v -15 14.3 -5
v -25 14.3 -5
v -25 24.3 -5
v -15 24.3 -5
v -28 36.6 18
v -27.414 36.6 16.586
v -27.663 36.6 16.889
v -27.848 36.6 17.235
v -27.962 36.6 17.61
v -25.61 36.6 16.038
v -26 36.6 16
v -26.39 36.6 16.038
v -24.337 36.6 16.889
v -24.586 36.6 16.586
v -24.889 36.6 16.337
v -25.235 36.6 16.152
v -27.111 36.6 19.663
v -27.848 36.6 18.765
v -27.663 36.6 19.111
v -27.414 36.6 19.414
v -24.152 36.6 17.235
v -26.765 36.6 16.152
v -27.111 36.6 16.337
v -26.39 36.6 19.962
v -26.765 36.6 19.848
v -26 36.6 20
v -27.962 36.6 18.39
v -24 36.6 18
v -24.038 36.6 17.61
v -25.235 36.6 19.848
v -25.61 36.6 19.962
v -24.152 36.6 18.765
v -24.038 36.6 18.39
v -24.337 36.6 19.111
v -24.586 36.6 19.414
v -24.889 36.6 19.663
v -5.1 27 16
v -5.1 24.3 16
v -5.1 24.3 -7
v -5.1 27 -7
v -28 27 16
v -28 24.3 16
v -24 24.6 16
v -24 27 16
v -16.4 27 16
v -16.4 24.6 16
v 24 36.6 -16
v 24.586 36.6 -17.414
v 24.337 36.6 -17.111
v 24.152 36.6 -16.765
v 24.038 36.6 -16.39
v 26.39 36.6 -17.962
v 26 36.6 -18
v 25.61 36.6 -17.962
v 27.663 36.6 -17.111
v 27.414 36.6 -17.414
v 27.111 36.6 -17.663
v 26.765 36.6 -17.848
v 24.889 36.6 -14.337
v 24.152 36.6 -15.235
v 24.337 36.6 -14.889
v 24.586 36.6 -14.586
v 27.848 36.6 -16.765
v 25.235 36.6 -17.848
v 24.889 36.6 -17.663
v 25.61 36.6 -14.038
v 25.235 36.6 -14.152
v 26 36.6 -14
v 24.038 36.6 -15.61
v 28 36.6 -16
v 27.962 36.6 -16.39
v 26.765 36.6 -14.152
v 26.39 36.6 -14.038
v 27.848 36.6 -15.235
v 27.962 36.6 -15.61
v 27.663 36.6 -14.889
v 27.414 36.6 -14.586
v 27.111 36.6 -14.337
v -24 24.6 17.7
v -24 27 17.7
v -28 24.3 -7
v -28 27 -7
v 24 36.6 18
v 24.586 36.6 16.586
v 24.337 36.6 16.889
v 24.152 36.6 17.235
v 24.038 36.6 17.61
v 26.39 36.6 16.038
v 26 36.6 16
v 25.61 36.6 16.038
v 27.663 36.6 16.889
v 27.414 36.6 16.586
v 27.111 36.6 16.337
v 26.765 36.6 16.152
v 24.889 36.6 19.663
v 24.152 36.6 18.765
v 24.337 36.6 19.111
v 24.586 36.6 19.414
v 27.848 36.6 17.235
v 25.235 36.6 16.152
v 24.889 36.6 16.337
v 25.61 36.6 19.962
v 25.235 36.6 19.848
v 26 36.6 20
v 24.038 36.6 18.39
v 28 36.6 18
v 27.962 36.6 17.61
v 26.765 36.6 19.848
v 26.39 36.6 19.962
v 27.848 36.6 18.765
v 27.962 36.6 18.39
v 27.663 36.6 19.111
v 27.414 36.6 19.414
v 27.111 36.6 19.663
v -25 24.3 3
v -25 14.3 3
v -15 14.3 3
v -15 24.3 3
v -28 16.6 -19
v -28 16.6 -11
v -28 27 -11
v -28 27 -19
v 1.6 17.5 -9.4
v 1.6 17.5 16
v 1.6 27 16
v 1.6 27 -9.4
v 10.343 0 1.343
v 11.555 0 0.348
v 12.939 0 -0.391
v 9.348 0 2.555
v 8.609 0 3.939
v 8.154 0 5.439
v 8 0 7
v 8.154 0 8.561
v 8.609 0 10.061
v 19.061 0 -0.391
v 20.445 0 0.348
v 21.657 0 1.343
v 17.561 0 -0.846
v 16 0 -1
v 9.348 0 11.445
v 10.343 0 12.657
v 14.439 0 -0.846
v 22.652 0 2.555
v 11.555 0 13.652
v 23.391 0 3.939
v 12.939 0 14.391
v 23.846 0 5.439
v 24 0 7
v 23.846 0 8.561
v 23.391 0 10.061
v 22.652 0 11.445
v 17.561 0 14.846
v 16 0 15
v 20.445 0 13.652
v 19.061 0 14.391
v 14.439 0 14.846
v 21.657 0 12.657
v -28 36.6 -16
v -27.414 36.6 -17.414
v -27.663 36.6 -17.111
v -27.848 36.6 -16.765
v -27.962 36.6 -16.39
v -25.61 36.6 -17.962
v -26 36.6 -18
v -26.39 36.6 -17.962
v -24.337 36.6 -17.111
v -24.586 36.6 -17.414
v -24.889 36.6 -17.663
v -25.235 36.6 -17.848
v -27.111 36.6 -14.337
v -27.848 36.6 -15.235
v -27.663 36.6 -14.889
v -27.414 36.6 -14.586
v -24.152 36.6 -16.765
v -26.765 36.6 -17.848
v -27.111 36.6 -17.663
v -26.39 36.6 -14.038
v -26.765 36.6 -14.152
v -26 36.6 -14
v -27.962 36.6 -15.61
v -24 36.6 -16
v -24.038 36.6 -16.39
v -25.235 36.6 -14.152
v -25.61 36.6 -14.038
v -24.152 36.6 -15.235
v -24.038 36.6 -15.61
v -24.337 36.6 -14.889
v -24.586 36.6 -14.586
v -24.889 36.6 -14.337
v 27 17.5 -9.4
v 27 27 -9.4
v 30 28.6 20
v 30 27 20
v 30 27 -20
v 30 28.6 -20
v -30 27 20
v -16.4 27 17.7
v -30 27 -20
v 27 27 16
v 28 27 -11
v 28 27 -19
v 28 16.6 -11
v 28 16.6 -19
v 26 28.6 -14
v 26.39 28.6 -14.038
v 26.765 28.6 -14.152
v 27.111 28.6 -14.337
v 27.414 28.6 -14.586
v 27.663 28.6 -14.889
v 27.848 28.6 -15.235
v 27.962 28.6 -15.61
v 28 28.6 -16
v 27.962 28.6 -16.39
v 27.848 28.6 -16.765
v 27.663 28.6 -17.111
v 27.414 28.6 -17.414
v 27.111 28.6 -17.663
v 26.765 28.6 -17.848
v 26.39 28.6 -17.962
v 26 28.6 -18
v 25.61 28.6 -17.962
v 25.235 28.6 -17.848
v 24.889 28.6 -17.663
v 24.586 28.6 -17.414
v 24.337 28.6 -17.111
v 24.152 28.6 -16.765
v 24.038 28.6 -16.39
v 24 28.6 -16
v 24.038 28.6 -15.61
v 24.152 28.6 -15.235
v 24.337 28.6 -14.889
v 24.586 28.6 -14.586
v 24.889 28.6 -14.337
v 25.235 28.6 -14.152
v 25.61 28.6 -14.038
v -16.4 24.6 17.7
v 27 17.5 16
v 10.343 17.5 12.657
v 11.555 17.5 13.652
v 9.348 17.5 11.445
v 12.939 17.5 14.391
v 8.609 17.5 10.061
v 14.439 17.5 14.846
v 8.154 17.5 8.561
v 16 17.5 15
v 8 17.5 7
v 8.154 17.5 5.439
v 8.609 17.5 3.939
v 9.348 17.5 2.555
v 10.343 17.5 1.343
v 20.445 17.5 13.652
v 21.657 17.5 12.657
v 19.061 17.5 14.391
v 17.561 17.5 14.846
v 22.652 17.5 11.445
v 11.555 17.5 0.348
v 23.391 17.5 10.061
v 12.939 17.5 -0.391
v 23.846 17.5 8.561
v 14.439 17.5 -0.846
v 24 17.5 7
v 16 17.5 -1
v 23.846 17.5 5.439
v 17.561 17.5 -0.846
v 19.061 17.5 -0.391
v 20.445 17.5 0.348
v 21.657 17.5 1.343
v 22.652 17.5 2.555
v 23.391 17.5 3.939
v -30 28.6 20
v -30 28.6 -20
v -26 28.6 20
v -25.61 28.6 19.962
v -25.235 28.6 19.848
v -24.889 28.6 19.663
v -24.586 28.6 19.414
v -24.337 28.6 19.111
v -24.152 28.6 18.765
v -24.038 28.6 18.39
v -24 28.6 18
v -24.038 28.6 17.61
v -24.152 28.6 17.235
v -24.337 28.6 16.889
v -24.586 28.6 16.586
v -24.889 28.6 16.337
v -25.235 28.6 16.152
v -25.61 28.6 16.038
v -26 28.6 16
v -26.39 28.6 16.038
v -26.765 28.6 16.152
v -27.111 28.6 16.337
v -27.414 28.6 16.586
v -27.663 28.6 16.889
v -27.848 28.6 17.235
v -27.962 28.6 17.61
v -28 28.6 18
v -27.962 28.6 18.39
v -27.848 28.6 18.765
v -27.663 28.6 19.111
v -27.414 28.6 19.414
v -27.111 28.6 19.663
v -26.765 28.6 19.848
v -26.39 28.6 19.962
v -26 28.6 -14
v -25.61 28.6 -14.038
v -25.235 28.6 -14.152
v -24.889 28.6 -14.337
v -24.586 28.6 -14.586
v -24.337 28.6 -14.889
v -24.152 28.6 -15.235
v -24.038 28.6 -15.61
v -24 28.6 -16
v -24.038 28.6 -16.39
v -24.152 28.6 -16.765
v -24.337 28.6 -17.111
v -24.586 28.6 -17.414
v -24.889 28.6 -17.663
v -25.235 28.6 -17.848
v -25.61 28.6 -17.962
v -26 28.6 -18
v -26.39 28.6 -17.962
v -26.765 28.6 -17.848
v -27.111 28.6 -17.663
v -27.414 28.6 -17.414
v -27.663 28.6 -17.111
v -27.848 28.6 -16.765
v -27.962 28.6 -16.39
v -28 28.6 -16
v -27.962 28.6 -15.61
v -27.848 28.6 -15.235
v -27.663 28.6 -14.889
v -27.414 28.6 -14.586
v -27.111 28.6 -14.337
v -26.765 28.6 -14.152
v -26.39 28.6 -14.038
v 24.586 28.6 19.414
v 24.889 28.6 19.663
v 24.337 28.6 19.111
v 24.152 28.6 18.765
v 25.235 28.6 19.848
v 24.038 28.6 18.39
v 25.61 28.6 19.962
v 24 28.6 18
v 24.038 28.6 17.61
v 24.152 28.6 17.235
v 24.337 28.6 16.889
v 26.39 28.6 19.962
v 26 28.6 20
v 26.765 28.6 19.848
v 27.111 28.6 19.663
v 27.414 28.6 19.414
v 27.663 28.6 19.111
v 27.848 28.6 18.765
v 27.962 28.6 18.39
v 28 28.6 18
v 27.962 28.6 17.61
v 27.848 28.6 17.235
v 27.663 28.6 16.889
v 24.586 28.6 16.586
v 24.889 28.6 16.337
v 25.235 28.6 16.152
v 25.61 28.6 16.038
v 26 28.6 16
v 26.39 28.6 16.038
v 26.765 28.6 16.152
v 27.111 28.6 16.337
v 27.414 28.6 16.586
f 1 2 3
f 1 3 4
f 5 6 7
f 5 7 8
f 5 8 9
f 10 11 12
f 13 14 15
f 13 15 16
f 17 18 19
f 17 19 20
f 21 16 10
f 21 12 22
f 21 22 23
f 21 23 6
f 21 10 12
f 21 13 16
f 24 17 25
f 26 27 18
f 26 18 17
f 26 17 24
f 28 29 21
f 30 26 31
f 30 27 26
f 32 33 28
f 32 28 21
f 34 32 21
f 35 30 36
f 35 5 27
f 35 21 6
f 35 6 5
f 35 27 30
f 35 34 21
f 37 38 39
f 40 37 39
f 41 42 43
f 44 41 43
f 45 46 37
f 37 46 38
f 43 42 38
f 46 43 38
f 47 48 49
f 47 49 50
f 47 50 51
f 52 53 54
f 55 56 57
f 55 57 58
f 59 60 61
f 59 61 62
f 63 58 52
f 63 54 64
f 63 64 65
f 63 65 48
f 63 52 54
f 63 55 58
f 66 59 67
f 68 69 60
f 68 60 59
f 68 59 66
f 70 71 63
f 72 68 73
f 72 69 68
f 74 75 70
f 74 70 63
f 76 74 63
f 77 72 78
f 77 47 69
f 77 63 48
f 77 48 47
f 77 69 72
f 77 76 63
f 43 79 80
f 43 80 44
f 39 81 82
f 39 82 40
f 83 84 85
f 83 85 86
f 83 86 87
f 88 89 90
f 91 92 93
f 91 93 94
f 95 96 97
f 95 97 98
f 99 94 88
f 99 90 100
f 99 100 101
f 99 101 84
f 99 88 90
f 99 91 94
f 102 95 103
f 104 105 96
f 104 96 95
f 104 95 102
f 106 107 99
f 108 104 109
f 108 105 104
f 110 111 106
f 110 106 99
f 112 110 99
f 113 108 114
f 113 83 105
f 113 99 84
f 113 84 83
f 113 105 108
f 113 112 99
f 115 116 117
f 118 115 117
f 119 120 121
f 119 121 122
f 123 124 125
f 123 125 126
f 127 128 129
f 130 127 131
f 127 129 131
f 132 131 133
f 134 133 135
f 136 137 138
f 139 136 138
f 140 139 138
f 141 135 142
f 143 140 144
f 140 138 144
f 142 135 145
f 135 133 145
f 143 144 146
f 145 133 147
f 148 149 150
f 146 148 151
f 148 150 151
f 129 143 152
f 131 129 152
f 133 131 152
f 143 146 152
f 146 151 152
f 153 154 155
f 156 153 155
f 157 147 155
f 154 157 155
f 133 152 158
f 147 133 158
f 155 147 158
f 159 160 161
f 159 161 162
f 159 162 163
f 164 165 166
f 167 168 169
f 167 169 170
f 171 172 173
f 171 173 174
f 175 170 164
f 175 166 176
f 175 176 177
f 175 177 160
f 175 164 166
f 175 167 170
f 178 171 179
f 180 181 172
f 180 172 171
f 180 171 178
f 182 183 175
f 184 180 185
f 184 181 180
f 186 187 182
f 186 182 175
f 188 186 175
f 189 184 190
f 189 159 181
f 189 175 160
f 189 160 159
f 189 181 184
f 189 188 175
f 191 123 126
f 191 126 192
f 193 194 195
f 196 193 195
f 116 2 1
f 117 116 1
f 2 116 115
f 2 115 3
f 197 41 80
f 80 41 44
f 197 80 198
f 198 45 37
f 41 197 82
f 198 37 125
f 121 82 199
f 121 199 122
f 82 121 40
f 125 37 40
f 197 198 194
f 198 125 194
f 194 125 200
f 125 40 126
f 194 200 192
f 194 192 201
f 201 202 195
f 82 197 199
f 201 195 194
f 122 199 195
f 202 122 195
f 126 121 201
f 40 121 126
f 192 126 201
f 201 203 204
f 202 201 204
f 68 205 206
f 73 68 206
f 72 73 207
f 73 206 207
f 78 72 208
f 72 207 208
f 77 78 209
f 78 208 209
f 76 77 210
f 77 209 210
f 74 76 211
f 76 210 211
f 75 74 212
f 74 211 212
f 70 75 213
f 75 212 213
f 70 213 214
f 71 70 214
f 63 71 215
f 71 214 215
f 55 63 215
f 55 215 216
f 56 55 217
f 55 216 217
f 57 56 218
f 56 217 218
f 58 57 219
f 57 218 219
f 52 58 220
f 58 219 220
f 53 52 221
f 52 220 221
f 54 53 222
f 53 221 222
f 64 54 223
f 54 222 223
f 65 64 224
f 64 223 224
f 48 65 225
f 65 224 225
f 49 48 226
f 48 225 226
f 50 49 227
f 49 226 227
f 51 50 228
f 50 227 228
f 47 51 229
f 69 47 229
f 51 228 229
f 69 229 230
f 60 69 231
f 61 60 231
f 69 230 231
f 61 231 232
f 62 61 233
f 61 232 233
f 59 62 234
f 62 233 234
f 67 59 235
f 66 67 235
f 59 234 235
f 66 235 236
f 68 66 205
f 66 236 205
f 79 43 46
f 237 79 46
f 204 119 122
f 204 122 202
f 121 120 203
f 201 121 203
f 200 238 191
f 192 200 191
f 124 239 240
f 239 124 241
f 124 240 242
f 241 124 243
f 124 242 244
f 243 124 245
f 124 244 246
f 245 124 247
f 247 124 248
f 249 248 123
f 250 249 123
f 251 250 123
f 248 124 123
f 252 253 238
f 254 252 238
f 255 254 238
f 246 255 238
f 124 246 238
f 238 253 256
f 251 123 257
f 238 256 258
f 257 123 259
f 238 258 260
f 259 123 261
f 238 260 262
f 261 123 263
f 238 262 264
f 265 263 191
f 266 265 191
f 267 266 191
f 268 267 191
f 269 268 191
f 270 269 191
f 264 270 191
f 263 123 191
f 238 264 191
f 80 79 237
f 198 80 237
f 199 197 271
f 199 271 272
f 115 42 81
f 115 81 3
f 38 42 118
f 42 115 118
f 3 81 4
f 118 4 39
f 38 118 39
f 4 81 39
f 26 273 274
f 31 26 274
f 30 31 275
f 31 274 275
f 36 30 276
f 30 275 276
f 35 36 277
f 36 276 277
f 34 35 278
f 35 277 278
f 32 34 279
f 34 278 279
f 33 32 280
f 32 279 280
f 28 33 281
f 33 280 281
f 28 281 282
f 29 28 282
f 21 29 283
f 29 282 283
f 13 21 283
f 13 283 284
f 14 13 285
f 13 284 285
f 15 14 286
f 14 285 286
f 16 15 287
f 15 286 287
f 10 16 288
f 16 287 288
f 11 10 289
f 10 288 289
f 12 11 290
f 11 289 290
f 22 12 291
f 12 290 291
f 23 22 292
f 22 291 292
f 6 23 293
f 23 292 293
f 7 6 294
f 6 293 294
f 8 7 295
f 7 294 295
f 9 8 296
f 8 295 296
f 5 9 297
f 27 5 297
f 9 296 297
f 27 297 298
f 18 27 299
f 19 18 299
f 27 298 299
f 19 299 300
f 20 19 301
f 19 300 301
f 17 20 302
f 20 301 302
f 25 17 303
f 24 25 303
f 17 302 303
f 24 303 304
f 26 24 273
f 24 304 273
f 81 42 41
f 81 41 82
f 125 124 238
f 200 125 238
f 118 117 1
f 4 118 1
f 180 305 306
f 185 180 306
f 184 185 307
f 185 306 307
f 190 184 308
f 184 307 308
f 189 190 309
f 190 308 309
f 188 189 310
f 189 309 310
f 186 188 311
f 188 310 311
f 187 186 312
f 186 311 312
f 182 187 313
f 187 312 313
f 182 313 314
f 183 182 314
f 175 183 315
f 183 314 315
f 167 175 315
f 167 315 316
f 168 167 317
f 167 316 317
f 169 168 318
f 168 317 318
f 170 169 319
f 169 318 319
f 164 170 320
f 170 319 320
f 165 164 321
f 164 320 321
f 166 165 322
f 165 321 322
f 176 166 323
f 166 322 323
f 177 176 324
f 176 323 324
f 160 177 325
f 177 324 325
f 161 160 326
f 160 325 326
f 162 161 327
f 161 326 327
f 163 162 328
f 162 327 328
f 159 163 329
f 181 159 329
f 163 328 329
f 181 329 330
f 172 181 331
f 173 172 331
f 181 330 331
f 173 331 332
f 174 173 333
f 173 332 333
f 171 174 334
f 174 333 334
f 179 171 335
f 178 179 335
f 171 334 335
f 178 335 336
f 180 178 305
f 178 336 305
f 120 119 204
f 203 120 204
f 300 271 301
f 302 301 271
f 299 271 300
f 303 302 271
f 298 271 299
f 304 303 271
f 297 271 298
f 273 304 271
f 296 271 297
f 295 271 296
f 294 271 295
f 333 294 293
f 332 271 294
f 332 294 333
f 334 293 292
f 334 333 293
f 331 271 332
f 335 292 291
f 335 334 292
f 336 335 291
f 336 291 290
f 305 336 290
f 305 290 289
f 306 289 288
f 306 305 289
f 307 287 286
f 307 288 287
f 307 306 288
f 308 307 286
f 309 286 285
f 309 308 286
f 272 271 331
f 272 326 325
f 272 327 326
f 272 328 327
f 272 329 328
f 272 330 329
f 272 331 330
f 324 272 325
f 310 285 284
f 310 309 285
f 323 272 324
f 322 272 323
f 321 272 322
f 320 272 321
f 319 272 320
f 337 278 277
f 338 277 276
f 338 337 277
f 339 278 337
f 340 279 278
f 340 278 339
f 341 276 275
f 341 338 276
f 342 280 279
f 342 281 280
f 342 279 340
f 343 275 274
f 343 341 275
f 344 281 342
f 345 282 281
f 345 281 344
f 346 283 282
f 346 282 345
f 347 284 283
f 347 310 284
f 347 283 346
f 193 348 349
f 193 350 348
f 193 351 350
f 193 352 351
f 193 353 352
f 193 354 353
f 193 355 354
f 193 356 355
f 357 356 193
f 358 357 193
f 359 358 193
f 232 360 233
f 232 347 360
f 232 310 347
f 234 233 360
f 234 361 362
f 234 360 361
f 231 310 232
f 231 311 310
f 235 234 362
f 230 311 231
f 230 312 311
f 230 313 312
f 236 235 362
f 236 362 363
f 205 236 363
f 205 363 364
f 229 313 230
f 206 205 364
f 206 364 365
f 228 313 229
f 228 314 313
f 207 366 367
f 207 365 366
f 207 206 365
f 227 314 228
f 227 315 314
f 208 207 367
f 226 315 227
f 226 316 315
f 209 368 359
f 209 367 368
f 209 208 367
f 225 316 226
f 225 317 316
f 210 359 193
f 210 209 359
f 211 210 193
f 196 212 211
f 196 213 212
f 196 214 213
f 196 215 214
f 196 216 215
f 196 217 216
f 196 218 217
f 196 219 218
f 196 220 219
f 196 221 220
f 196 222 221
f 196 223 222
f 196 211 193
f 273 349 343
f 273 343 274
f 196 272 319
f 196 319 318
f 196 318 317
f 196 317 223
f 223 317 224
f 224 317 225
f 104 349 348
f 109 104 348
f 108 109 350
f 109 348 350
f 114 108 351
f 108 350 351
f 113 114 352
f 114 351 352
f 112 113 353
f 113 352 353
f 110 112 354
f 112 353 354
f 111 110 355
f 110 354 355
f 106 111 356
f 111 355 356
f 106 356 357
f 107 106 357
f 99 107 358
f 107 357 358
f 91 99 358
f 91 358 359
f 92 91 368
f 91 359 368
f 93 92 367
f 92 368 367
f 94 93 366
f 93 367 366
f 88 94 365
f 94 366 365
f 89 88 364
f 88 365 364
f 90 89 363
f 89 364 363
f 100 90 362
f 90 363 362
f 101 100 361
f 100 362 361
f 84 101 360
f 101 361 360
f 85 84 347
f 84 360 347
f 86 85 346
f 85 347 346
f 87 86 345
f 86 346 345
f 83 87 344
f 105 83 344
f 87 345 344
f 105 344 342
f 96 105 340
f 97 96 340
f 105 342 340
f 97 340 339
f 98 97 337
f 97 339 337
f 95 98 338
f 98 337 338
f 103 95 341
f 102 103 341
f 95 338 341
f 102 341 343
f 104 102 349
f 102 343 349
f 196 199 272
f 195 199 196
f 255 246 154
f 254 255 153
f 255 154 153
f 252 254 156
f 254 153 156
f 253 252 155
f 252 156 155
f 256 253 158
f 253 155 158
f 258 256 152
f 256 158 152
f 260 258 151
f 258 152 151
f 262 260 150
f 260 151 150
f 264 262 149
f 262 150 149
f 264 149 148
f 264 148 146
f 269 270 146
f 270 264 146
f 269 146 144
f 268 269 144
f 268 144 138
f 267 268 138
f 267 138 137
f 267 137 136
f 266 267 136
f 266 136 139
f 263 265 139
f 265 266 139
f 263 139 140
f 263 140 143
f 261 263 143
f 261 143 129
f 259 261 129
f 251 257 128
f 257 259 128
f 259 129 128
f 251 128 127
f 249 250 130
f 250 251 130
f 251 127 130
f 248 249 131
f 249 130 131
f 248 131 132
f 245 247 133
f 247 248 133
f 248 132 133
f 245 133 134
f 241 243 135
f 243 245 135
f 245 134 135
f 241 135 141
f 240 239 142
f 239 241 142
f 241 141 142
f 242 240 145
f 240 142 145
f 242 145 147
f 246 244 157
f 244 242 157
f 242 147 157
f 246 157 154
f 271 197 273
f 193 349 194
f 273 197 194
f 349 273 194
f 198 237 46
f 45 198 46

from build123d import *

# Parameters (mm, degrees)
P01_STANDOFF_START             = 28.6
SK_P01_STANDOFF_R              = 2
P01_STANDOFF_DEPTH             = 8
P02_STANDOFF_START             = 28.6
SK_P02_STANDOFF_R              = 2
P02_STANDOFF_DEPTH             = 8
P03_STANDOFF_START             = 28.6
SK_P03_STANDOFF_R              = 2
P03_STANDOFF_DEPTH             = 8
P04_STANDOFF_START             = 28.6
SK_P04_STANDOFF_R              = 2
P04_STANDOFF_DEPTH             = 8
P05_CARRIERBOARD_START         = 27
SK_P05_CARRIERBOARD_W          = 60
SK_P05_CARRIERBOARD_H          = 40
P05_CARRIERBOARD_DEPTH         = 1.6
P06_INA2602COMPUTE_START       = 24.3
SK_P06_INA2602COMPUTE_W        = 22.9
SK_P06_INA2602COMPUTE_H        = 23
P06_INA2602COMPUTE_DEPTH       = 2.7
P07_INA260TERMINALBLOCK_START  = 14.3
SK_P07_INA260TERMINALBLOCK_W   = 10
SK_P07_INA260TERMINALBLOCK_H   = 8
P07_INA260TERMINALBLOCK_DEPTH  = 10
P08_BUCKAD36V50F551V_START     = 17.5
SK_P08_BUCKAD36V50F551V_W      = 25.4
SK_P08_BUCKAD36V50F551V_H      = 25.4
P08_BUCKAD36V50F551V_DEPTH     = 9.5
P09_JSTXHHEADERSFACEDOWN_START = 16.6
SK_P09_JSTXHHEADERSFACEDOWN_W  = 56
SK_P09_JSTXHHEADERSFACEDOWN_H  = 8
P09_JSTXHHEADERSFACEDOWN_DEPTH = 10.4
P10_D2IDEALDIODE_START         = 24.6
SK_P10_D2IDEALDIODE_W          = 7.6
SK_P10_D2IDEALDIODE_H          = 12.7
P10_D2IDEALDIODE_DEPTH         = 2.4
SK_P11_C14700UF25V_R           = 8
P11_C14700UF25V_DEPTH          = 27


with BuildPart() as part:
    # SK_P01_Standoff → P01_Standoff (new body)
    with BuildSketch(Plane(origin=(0, 0, 0), x_dir=(1, 0, 0), z_dir=(0, 1, 0)).offset(P01_STANDOFF_START)):
        with Locations(Location((-26, -18, 0), (0, 0, 270))):
            Circle(SK_P01_STANDOFF_R)
    extrude(amount=P01_STANDOFF_DEPTH)



with BuildPart() as body_2:
    # SK_P02_Standoff → P02_Standoff (new body)
    with BuildSketch(Plane(origin=(0, 0, 0), x_dir=(1, 0, 0), z_dir=(0, 1, 0)).offset(P02_STANDOFF_START)):
        with Locations(Location((-26, 16, 0), (0, 0, 270))):
            Circle(SK_P02_STANDOFF_R)
    extrude(amount=P02_STANDOFF_DEPTH)


with BuildPart() as body_3:
    # SK_P03_Standoff → P03_Standoff (new body)
    with BuildSketch(Plane(origin=(0, 0, 0), x_dir=(1, 0, 0), z_dir=(0, 1, 0)).offset(P03_STANDOFF_START)):
        with Locations(Location((26, -18, 0), (0, 0, 270))):
            Circle(SK_P03_STANDOFF_R)
    extrude(amount=P03_STANDOFF_DEPTH)


with BuildPart() as body_4:
    # SK_P04_Standoff → P04_Standoff (new body)
    with BuildSketch(Plane(origin=(0, 0, 0), x_dir=(1, 0, 0), z_dir=(0, 1, 0)).offset(P04_STANDOFF_START)):
        with Locations(Location((26, 16, 0), (0, 0, 270))):
            Circle(SK_P04_STANDOFF_R)
    extrude(amount=P04_STANDOFF_DEPTH)


with BuildPart() as part_1:
    add(part.part)

    add(body_2.part)  # P05_Carrierboard merges body 2

    add(body_3.part)  # P05_Carrierboard merges body 3

    add(body_4.part)  # P05_Carrierboard merges body 4
    # SK_P05_Carrierboard → P05_Carrierboard (add)
    with BuildSketch(Plane(origin=(0, 0, 0), x_dir=(1, 0, 0), z_dir=(0, 1, 0)).offset(P05_CARRIERBOARD_START)):
        Rectangle(SK_P05_CARRIERBOARD_W, SK_P05_CARRIERBOARD_H)
    extrude(amount=P05_CARRIERBOARD_DEPTH)

    # SK_P06_INA2602compute → P06_INA2602compute (add)
    with BuildSketch(Plane(origin=(0, 0, 0), x_dir=(1, 0, 0), z_dir=(0, 1, 0)).offset(P06_INA2602COMPUTE_START)):
        with Locations((-16.55, -4.5)):
            Rectangle(SK_P06_INA2602COMPUTE_W, SK_P06_INA2602COMPUTE_H)
    extrude(amount=P06_INA2602COMPUTE_DEPTH)

    # SK_P07_INA260terminalblock → P07_INA260terminalblock (add)
    with BuildSketch(Plane(origin=(0, 0, 0), x_dir=(1, 0, 0), z_dir=(0, 1, 0)).offset(P07_INA260TERMINALBLOCK_START)):
        with Locations((-20, 1)):
            Rectangle(SK_P07_INA260TERMINALBLOCK_W, SK_P07_INA260TERMINALBLOCK_H)
    extrude(amount=P07_INA260TERMINALBLOCK_DEPTH)

    # SK_P08_BuckAD36V50F551V → P08_BuckAD36V50F551V (add)
    with BuildSketch(Plane(origin=(0, 0, 0), x_dir=(1, 0, 0), z_dir=(0, 1, 0)).offset(P08_BUCKAD36V50F551V_START)):
        with Locations((14.3, -3.3)):
            Rectangle(SK_P08_BUCKAD36V50F551V_W, SK_P08_BUCKAD36V50F551V_H)
    extrude(amount=P08_BUCKAD36V50F551V_DEPTH)

    # SK_P09_JSTXHheadersfacedown → P09_JSTXHheadersfacedown (add)
    with BuildSketch(Plane(origin=(0, 0, 0), x_dir=(1, 0, 0), z_dir=(0, 1, 0)).offset(P09_JSTXHHEADERSFACEDOWN_START)):
        with Locations((0, 15)):
            Rectangle(SK_P09_JSTXHHEADERSFACEDOWN_W, SK_P09_JSTXHHEADERSFACEDOWN_H)
    extrude(amount=P09_JSTXHHEADERSFACEDOWN_DEPTH)

    # SK_P10_D2idealdiode → P10_D2idealdiode (add)
    with BuildSketch(Plane(origin=(0, 0, 0), x_dir=(1, 0, 0), z_dir=(0, 1, 0)).offset(P10_D2IDEALDIODE_START)):
        with Locations((-20.2, -11.35)):
            Rectangle(SK_P10_D2IDEALDIODE_W, SK_P10_D2IDEALDIODE_H)
    extrude(amount=P10_D2IDEALDIODE_DEPTH)

    # SK_P11_C14700uF25V → P11_C14700uF25V (add)
    with BuildSketch(Plane(origin=(0, 0, 0), x_dir=(1, 0, 0), z_dir=(0, 1, 0))):
        with Locations(Location((16, -7, 0), (0, 0, 270))):
            Circle(SK_P11_C14700UF25V_R)
    extrude(amount=P11_C14700UF25V_DEPTH)


solid = part_1.part
